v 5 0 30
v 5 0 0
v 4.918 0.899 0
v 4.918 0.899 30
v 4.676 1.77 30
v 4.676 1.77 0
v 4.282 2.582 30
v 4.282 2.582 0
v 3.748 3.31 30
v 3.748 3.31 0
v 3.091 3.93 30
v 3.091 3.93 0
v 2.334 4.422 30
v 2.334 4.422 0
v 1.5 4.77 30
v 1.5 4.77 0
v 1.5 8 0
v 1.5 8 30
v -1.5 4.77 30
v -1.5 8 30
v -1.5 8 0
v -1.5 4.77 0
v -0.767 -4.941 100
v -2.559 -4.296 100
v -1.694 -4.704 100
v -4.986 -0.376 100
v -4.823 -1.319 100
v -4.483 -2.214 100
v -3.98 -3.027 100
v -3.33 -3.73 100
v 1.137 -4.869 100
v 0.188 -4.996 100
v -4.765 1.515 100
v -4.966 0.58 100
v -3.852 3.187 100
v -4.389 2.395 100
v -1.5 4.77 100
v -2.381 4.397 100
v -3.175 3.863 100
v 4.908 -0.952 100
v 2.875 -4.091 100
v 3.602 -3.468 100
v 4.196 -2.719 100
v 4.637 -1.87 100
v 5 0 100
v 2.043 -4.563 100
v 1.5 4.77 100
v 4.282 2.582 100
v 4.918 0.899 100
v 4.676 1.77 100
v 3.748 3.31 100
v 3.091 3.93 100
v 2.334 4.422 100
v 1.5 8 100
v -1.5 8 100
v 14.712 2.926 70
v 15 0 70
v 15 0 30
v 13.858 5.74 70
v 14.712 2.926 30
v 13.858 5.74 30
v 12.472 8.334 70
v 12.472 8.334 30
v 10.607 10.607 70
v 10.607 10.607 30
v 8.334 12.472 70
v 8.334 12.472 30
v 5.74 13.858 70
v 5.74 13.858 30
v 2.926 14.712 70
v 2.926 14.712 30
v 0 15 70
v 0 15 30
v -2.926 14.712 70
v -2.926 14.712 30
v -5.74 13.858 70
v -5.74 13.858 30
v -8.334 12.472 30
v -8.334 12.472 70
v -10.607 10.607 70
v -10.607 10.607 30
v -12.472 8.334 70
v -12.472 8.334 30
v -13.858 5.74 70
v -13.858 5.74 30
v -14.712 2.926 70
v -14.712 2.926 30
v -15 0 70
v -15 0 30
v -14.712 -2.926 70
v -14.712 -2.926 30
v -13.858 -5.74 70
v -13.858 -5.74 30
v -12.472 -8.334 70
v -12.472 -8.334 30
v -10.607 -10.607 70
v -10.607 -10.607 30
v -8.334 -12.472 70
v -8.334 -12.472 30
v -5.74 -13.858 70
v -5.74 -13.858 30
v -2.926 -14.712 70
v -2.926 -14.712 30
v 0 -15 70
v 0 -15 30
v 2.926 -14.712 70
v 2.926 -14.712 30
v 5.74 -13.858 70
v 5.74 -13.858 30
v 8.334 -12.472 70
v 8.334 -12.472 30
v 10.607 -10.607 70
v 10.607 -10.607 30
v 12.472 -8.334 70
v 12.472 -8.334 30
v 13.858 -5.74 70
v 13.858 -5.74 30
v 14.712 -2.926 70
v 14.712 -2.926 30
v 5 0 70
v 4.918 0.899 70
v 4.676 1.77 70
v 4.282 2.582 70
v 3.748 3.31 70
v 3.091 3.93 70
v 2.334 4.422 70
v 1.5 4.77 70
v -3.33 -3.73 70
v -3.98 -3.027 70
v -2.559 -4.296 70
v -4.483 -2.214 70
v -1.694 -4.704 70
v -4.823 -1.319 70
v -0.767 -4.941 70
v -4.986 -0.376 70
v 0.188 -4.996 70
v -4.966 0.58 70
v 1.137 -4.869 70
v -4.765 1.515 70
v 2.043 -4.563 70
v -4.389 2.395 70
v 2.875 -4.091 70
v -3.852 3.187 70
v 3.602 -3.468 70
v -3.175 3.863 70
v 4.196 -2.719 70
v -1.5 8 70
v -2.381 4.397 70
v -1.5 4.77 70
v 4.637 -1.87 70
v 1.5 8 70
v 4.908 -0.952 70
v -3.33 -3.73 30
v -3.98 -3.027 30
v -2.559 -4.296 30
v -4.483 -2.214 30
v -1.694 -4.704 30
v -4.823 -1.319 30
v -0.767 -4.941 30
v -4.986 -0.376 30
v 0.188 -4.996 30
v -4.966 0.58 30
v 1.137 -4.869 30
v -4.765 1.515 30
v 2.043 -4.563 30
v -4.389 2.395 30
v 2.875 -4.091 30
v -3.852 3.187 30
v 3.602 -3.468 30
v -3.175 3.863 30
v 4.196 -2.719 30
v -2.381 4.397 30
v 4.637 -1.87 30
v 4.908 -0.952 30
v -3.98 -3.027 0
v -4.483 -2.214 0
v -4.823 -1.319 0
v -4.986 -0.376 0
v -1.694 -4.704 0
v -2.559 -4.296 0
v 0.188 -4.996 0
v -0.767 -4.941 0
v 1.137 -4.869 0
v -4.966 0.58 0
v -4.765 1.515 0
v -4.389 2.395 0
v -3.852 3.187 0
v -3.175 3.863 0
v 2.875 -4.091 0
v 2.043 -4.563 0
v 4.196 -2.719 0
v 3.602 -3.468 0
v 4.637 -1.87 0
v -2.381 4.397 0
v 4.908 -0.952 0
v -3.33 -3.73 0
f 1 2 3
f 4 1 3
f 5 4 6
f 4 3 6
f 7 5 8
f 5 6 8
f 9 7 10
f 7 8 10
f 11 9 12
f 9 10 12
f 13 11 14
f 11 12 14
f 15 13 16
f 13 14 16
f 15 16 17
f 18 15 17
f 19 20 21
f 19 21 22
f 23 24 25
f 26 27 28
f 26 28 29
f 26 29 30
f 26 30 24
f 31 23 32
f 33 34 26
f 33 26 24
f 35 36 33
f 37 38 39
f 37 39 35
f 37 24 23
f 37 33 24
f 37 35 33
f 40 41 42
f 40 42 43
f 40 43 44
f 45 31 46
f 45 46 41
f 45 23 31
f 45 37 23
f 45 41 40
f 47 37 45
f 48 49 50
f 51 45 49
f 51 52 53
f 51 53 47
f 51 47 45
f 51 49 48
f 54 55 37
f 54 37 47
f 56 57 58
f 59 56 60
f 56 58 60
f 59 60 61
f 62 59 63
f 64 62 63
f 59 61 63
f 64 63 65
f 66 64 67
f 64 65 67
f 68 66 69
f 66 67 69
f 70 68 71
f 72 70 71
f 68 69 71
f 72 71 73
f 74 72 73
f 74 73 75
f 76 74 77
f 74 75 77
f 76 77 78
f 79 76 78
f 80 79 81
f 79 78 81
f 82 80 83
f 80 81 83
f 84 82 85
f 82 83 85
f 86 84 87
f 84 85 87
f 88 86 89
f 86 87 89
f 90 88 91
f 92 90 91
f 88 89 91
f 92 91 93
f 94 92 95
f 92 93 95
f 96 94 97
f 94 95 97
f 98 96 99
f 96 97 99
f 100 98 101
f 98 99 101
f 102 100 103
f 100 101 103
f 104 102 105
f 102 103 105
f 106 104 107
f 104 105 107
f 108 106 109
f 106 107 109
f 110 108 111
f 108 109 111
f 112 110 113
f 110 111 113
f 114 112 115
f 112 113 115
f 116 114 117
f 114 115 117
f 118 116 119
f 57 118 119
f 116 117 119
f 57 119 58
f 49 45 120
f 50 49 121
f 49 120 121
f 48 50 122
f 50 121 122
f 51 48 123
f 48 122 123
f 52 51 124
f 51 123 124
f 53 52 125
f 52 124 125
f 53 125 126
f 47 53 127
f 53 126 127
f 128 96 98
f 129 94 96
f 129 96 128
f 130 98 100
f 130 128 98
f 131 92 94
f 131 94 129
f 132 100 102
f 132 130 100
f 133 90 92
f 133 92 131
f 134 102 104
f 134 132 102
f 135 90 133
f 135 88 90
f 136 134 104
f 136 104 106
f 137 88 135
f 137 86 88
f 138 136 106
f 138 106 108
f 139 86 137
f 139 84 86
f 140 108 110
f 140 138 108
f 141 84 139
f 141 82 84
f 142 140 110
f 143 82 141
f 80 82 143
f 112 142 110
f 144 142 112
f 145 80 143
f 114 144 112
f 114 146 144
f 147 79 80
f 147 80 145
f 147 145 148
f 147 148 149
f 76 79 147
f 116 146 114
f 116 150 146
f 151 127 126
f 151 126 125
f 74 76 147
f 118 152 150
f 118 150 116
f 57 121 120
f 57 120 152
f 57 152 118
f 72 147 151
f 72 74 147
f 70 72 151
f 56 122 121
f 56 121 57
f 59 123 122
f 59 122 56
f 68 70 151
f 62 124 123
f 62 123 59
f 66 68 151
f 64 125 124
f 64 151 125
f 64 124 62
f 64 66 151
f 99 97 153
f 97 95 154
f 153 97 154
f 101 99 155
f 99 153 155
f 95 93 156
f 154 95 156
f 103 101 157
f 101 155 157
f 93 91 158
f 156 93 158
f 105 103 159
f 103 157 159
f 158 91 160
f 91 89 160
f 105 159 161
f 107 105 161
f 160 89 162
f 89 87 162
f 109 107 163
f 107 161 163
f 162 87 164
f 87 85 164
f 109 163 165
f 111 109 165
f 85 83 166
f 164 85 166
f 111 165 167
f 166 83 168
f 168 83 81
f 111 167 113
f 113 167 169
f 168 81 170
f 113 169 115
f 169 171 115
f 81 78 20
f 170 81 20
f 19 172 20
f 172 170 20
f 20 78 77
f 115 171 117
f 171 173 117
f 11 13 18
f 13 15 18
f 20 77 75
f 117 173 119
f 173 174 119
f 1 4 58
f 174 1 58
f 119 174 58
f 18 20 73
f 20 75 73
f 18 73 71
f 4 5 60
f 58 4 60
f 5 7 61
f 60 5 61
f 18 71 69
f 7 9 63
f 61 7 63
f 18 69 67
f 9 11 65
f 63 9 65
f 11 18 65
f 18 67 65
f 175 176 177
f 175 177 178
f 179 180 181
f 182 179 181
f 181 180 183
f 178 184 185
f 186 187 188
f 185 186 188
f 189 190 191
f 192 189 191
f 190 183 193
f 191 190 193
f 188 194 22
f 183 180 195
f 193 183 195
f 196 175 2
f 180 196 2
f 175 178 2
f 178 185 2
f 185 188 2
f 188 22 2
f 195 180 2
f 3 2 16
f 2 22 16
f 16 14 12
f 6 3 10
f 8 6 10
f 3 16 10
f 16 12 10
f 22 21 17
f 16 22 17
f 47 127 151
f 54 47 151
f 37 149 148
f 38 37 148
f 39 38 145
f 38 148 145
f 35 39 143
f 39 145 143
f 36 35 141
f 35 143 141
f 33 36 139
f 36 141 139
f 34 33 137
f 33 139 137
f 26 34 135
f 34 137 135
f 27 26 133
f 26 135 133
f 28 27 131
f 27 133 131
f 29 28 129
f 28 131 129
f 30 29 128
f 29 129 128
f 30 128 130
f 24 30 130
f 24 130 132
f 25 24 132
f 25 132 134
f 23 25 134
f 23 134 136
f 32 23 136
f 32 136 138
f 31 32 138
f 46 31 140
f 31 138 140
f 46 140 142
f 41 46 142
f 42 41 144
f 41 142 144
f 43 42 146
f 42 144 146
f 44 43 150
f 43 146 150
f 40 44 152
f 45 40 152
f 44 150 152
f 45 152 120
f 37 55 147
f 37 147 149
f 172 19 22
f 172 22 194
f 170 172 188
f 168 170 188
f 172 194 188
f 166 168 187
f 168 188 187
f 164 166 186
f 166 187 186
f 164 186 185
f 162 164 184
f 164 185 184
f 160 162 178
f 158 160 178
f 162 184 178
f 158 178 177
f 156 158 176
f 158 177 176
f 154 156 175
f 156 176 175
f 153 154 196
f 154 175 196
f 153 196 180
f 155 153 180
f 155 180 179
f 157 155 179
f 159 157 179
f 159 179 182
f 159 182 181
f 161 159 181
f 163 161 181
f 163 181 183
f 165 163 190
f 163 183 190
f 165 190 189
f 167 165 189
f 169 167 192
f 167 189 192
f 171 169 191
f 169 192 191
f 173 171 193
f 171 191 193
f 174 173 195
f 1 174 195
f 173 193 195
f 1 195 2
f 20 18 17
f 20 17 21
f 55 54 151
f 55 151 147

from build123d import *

# Parameters (mm, degrees)
EXTRUDE_1_DEPTH = 30
SKETCH_2_R      = 15
EXTRUDE_2_DEPTH = 25
EXTRUDE_3_DEPTH = 30
SKETCH_4_R      = 15
EXTRUDE_4_DEPTH = 15
EXTRUDE_5_DEPTH = 15


with BuildPart() as part:
    # 草图1 → 凸台-拉伸1 (new body)
    with BuildSketch(Plane.XY):
        with BuildLine():
            Line((-1.5, 8), (-1.5, 4.769696007))
            ThreePointArc((-1.5, 4.769696007), (0, 5), (1.5, 4.769696007))
            Line((1.5, 4.769696007), (1.5, 8))
            Line((1.5, 8), (-1.5, 8))
        make_face()
        with BuildLine():
            Line((1.5, 0), (0, 0))
            Line((0, 0), (-1.5, 0))
            Line((-1.5, 0), (-1.5, 4.769696007))
            ThreePointArc((-1.5, 4.769696007), (-2.958039892, -4.031128874), (5, 0))
            ThreePointArc((5, 0), (4.031128874, 2.958039892), (1.5, 4.769696007))
            Line((1.5, 4.769696007), (1.5, 0))
        make_face()
        with BuildLine():
            Line((-1.5, 0), (0, 0))
            Line((0, 0), (1.5, 0))
            Line((1.5, 0), (1.5, 4.769696007))
            ThreePointArc((1.5, 4.769696007), (0, 5), (-1.5, 4.769696007))
            Line((-1.5, 4.769696007), (-1.5, 0))
        make_face()
    extrude(amount=EXTRUDE_1_DEPTH)

    # 草图2 → 凸台-拉伸2 (add)
    with BuildSketch(Plane.XY.offset(30)):
        Circle(SKETCH_2_R)
    extrude(amount=EXTRUDE_2_DEPTH)

    # 草图3 → 凸台-拉伸3 (add)
    with BuildSketch(Plane.XY.offset(55)):
        with BuildLine():
            Line((1.5, 0), (0, 0))
            Line((0, 0), (-1.5, 0))
            Line((-1.5, 0), (-1.5, 4.769696007))
            ThreePointArc((-1.5, 4.769696007), (-2.958039892, -4.031128874), (5, 0))
            ThreePointArc((5, 0), (4.031128874, 2.958039892), (1.5, 4.769696007))
            Line((1.5, 4.769696007), (1.5, 0))
        make_face()
        with BuildLine():
            Line((-1.5, 0), (0, 0))
            Line((0, 0), (1.5, 0))
            Line((1.5, 0), (1.5, 4.769696007))
            ThreePointArc((1.5, 4.769696007), (0, 5), (-1.5, 4.769696007))
            Line((-1.5, 4.769696007), (-1.5, 0))
        make_face()
        with BuildLine():
            Line((-1.5, 8), (-1.5, 4.769696007))
            ThreePointArc((-1.5, 4.769696007), (0, 5), (1.5, 4.769696007))
            Line((1.5, 4.769696007), (1.5, 8))
            Line((1.5, 8), (-1.5, 8))
        make_face()
    extrude(amount=EXTRUDE_3_DEPTH)

    # 草图4 → 凸台-拉伸4 (add)
    with BuildSketch(Plane.XY.offset(55)):
        Circle(SKETCH_4_R)
    extrude(amount=EXTRUDE_4_DEPTH)

    # 草图5 → 凸台-拉伸5 (add)
    with BuildSketch(Plane.XY.offset(85)):
        with BuildLine():
            ThreePointArc((1.5, 4.769696007), (0, 5), (-1.5, 4.769696007))
            ThreePointArc((-1.5, 4.769696007), (-2.958039892, -4.031128874), (5, 0))
            ThreePointArc((5, 0), (4.031128874, 2.958039892), (1.5, 4.769696007))
        make_face()
        with BuildLine():
            Line((1.5, 8), (-1.5, 8))
            Line((-1.5, 8), (-1.5, 4.769696007))
            ThreePointArc((-1.5, 4.769696007), (0, 5), (1.5, 4.769696007))
            Line((1.5, 4.769696007), (1.5, 8))
        make_face()
    extrude(amount=EXTRUDE_5_DEPTH)


solid = part.part
